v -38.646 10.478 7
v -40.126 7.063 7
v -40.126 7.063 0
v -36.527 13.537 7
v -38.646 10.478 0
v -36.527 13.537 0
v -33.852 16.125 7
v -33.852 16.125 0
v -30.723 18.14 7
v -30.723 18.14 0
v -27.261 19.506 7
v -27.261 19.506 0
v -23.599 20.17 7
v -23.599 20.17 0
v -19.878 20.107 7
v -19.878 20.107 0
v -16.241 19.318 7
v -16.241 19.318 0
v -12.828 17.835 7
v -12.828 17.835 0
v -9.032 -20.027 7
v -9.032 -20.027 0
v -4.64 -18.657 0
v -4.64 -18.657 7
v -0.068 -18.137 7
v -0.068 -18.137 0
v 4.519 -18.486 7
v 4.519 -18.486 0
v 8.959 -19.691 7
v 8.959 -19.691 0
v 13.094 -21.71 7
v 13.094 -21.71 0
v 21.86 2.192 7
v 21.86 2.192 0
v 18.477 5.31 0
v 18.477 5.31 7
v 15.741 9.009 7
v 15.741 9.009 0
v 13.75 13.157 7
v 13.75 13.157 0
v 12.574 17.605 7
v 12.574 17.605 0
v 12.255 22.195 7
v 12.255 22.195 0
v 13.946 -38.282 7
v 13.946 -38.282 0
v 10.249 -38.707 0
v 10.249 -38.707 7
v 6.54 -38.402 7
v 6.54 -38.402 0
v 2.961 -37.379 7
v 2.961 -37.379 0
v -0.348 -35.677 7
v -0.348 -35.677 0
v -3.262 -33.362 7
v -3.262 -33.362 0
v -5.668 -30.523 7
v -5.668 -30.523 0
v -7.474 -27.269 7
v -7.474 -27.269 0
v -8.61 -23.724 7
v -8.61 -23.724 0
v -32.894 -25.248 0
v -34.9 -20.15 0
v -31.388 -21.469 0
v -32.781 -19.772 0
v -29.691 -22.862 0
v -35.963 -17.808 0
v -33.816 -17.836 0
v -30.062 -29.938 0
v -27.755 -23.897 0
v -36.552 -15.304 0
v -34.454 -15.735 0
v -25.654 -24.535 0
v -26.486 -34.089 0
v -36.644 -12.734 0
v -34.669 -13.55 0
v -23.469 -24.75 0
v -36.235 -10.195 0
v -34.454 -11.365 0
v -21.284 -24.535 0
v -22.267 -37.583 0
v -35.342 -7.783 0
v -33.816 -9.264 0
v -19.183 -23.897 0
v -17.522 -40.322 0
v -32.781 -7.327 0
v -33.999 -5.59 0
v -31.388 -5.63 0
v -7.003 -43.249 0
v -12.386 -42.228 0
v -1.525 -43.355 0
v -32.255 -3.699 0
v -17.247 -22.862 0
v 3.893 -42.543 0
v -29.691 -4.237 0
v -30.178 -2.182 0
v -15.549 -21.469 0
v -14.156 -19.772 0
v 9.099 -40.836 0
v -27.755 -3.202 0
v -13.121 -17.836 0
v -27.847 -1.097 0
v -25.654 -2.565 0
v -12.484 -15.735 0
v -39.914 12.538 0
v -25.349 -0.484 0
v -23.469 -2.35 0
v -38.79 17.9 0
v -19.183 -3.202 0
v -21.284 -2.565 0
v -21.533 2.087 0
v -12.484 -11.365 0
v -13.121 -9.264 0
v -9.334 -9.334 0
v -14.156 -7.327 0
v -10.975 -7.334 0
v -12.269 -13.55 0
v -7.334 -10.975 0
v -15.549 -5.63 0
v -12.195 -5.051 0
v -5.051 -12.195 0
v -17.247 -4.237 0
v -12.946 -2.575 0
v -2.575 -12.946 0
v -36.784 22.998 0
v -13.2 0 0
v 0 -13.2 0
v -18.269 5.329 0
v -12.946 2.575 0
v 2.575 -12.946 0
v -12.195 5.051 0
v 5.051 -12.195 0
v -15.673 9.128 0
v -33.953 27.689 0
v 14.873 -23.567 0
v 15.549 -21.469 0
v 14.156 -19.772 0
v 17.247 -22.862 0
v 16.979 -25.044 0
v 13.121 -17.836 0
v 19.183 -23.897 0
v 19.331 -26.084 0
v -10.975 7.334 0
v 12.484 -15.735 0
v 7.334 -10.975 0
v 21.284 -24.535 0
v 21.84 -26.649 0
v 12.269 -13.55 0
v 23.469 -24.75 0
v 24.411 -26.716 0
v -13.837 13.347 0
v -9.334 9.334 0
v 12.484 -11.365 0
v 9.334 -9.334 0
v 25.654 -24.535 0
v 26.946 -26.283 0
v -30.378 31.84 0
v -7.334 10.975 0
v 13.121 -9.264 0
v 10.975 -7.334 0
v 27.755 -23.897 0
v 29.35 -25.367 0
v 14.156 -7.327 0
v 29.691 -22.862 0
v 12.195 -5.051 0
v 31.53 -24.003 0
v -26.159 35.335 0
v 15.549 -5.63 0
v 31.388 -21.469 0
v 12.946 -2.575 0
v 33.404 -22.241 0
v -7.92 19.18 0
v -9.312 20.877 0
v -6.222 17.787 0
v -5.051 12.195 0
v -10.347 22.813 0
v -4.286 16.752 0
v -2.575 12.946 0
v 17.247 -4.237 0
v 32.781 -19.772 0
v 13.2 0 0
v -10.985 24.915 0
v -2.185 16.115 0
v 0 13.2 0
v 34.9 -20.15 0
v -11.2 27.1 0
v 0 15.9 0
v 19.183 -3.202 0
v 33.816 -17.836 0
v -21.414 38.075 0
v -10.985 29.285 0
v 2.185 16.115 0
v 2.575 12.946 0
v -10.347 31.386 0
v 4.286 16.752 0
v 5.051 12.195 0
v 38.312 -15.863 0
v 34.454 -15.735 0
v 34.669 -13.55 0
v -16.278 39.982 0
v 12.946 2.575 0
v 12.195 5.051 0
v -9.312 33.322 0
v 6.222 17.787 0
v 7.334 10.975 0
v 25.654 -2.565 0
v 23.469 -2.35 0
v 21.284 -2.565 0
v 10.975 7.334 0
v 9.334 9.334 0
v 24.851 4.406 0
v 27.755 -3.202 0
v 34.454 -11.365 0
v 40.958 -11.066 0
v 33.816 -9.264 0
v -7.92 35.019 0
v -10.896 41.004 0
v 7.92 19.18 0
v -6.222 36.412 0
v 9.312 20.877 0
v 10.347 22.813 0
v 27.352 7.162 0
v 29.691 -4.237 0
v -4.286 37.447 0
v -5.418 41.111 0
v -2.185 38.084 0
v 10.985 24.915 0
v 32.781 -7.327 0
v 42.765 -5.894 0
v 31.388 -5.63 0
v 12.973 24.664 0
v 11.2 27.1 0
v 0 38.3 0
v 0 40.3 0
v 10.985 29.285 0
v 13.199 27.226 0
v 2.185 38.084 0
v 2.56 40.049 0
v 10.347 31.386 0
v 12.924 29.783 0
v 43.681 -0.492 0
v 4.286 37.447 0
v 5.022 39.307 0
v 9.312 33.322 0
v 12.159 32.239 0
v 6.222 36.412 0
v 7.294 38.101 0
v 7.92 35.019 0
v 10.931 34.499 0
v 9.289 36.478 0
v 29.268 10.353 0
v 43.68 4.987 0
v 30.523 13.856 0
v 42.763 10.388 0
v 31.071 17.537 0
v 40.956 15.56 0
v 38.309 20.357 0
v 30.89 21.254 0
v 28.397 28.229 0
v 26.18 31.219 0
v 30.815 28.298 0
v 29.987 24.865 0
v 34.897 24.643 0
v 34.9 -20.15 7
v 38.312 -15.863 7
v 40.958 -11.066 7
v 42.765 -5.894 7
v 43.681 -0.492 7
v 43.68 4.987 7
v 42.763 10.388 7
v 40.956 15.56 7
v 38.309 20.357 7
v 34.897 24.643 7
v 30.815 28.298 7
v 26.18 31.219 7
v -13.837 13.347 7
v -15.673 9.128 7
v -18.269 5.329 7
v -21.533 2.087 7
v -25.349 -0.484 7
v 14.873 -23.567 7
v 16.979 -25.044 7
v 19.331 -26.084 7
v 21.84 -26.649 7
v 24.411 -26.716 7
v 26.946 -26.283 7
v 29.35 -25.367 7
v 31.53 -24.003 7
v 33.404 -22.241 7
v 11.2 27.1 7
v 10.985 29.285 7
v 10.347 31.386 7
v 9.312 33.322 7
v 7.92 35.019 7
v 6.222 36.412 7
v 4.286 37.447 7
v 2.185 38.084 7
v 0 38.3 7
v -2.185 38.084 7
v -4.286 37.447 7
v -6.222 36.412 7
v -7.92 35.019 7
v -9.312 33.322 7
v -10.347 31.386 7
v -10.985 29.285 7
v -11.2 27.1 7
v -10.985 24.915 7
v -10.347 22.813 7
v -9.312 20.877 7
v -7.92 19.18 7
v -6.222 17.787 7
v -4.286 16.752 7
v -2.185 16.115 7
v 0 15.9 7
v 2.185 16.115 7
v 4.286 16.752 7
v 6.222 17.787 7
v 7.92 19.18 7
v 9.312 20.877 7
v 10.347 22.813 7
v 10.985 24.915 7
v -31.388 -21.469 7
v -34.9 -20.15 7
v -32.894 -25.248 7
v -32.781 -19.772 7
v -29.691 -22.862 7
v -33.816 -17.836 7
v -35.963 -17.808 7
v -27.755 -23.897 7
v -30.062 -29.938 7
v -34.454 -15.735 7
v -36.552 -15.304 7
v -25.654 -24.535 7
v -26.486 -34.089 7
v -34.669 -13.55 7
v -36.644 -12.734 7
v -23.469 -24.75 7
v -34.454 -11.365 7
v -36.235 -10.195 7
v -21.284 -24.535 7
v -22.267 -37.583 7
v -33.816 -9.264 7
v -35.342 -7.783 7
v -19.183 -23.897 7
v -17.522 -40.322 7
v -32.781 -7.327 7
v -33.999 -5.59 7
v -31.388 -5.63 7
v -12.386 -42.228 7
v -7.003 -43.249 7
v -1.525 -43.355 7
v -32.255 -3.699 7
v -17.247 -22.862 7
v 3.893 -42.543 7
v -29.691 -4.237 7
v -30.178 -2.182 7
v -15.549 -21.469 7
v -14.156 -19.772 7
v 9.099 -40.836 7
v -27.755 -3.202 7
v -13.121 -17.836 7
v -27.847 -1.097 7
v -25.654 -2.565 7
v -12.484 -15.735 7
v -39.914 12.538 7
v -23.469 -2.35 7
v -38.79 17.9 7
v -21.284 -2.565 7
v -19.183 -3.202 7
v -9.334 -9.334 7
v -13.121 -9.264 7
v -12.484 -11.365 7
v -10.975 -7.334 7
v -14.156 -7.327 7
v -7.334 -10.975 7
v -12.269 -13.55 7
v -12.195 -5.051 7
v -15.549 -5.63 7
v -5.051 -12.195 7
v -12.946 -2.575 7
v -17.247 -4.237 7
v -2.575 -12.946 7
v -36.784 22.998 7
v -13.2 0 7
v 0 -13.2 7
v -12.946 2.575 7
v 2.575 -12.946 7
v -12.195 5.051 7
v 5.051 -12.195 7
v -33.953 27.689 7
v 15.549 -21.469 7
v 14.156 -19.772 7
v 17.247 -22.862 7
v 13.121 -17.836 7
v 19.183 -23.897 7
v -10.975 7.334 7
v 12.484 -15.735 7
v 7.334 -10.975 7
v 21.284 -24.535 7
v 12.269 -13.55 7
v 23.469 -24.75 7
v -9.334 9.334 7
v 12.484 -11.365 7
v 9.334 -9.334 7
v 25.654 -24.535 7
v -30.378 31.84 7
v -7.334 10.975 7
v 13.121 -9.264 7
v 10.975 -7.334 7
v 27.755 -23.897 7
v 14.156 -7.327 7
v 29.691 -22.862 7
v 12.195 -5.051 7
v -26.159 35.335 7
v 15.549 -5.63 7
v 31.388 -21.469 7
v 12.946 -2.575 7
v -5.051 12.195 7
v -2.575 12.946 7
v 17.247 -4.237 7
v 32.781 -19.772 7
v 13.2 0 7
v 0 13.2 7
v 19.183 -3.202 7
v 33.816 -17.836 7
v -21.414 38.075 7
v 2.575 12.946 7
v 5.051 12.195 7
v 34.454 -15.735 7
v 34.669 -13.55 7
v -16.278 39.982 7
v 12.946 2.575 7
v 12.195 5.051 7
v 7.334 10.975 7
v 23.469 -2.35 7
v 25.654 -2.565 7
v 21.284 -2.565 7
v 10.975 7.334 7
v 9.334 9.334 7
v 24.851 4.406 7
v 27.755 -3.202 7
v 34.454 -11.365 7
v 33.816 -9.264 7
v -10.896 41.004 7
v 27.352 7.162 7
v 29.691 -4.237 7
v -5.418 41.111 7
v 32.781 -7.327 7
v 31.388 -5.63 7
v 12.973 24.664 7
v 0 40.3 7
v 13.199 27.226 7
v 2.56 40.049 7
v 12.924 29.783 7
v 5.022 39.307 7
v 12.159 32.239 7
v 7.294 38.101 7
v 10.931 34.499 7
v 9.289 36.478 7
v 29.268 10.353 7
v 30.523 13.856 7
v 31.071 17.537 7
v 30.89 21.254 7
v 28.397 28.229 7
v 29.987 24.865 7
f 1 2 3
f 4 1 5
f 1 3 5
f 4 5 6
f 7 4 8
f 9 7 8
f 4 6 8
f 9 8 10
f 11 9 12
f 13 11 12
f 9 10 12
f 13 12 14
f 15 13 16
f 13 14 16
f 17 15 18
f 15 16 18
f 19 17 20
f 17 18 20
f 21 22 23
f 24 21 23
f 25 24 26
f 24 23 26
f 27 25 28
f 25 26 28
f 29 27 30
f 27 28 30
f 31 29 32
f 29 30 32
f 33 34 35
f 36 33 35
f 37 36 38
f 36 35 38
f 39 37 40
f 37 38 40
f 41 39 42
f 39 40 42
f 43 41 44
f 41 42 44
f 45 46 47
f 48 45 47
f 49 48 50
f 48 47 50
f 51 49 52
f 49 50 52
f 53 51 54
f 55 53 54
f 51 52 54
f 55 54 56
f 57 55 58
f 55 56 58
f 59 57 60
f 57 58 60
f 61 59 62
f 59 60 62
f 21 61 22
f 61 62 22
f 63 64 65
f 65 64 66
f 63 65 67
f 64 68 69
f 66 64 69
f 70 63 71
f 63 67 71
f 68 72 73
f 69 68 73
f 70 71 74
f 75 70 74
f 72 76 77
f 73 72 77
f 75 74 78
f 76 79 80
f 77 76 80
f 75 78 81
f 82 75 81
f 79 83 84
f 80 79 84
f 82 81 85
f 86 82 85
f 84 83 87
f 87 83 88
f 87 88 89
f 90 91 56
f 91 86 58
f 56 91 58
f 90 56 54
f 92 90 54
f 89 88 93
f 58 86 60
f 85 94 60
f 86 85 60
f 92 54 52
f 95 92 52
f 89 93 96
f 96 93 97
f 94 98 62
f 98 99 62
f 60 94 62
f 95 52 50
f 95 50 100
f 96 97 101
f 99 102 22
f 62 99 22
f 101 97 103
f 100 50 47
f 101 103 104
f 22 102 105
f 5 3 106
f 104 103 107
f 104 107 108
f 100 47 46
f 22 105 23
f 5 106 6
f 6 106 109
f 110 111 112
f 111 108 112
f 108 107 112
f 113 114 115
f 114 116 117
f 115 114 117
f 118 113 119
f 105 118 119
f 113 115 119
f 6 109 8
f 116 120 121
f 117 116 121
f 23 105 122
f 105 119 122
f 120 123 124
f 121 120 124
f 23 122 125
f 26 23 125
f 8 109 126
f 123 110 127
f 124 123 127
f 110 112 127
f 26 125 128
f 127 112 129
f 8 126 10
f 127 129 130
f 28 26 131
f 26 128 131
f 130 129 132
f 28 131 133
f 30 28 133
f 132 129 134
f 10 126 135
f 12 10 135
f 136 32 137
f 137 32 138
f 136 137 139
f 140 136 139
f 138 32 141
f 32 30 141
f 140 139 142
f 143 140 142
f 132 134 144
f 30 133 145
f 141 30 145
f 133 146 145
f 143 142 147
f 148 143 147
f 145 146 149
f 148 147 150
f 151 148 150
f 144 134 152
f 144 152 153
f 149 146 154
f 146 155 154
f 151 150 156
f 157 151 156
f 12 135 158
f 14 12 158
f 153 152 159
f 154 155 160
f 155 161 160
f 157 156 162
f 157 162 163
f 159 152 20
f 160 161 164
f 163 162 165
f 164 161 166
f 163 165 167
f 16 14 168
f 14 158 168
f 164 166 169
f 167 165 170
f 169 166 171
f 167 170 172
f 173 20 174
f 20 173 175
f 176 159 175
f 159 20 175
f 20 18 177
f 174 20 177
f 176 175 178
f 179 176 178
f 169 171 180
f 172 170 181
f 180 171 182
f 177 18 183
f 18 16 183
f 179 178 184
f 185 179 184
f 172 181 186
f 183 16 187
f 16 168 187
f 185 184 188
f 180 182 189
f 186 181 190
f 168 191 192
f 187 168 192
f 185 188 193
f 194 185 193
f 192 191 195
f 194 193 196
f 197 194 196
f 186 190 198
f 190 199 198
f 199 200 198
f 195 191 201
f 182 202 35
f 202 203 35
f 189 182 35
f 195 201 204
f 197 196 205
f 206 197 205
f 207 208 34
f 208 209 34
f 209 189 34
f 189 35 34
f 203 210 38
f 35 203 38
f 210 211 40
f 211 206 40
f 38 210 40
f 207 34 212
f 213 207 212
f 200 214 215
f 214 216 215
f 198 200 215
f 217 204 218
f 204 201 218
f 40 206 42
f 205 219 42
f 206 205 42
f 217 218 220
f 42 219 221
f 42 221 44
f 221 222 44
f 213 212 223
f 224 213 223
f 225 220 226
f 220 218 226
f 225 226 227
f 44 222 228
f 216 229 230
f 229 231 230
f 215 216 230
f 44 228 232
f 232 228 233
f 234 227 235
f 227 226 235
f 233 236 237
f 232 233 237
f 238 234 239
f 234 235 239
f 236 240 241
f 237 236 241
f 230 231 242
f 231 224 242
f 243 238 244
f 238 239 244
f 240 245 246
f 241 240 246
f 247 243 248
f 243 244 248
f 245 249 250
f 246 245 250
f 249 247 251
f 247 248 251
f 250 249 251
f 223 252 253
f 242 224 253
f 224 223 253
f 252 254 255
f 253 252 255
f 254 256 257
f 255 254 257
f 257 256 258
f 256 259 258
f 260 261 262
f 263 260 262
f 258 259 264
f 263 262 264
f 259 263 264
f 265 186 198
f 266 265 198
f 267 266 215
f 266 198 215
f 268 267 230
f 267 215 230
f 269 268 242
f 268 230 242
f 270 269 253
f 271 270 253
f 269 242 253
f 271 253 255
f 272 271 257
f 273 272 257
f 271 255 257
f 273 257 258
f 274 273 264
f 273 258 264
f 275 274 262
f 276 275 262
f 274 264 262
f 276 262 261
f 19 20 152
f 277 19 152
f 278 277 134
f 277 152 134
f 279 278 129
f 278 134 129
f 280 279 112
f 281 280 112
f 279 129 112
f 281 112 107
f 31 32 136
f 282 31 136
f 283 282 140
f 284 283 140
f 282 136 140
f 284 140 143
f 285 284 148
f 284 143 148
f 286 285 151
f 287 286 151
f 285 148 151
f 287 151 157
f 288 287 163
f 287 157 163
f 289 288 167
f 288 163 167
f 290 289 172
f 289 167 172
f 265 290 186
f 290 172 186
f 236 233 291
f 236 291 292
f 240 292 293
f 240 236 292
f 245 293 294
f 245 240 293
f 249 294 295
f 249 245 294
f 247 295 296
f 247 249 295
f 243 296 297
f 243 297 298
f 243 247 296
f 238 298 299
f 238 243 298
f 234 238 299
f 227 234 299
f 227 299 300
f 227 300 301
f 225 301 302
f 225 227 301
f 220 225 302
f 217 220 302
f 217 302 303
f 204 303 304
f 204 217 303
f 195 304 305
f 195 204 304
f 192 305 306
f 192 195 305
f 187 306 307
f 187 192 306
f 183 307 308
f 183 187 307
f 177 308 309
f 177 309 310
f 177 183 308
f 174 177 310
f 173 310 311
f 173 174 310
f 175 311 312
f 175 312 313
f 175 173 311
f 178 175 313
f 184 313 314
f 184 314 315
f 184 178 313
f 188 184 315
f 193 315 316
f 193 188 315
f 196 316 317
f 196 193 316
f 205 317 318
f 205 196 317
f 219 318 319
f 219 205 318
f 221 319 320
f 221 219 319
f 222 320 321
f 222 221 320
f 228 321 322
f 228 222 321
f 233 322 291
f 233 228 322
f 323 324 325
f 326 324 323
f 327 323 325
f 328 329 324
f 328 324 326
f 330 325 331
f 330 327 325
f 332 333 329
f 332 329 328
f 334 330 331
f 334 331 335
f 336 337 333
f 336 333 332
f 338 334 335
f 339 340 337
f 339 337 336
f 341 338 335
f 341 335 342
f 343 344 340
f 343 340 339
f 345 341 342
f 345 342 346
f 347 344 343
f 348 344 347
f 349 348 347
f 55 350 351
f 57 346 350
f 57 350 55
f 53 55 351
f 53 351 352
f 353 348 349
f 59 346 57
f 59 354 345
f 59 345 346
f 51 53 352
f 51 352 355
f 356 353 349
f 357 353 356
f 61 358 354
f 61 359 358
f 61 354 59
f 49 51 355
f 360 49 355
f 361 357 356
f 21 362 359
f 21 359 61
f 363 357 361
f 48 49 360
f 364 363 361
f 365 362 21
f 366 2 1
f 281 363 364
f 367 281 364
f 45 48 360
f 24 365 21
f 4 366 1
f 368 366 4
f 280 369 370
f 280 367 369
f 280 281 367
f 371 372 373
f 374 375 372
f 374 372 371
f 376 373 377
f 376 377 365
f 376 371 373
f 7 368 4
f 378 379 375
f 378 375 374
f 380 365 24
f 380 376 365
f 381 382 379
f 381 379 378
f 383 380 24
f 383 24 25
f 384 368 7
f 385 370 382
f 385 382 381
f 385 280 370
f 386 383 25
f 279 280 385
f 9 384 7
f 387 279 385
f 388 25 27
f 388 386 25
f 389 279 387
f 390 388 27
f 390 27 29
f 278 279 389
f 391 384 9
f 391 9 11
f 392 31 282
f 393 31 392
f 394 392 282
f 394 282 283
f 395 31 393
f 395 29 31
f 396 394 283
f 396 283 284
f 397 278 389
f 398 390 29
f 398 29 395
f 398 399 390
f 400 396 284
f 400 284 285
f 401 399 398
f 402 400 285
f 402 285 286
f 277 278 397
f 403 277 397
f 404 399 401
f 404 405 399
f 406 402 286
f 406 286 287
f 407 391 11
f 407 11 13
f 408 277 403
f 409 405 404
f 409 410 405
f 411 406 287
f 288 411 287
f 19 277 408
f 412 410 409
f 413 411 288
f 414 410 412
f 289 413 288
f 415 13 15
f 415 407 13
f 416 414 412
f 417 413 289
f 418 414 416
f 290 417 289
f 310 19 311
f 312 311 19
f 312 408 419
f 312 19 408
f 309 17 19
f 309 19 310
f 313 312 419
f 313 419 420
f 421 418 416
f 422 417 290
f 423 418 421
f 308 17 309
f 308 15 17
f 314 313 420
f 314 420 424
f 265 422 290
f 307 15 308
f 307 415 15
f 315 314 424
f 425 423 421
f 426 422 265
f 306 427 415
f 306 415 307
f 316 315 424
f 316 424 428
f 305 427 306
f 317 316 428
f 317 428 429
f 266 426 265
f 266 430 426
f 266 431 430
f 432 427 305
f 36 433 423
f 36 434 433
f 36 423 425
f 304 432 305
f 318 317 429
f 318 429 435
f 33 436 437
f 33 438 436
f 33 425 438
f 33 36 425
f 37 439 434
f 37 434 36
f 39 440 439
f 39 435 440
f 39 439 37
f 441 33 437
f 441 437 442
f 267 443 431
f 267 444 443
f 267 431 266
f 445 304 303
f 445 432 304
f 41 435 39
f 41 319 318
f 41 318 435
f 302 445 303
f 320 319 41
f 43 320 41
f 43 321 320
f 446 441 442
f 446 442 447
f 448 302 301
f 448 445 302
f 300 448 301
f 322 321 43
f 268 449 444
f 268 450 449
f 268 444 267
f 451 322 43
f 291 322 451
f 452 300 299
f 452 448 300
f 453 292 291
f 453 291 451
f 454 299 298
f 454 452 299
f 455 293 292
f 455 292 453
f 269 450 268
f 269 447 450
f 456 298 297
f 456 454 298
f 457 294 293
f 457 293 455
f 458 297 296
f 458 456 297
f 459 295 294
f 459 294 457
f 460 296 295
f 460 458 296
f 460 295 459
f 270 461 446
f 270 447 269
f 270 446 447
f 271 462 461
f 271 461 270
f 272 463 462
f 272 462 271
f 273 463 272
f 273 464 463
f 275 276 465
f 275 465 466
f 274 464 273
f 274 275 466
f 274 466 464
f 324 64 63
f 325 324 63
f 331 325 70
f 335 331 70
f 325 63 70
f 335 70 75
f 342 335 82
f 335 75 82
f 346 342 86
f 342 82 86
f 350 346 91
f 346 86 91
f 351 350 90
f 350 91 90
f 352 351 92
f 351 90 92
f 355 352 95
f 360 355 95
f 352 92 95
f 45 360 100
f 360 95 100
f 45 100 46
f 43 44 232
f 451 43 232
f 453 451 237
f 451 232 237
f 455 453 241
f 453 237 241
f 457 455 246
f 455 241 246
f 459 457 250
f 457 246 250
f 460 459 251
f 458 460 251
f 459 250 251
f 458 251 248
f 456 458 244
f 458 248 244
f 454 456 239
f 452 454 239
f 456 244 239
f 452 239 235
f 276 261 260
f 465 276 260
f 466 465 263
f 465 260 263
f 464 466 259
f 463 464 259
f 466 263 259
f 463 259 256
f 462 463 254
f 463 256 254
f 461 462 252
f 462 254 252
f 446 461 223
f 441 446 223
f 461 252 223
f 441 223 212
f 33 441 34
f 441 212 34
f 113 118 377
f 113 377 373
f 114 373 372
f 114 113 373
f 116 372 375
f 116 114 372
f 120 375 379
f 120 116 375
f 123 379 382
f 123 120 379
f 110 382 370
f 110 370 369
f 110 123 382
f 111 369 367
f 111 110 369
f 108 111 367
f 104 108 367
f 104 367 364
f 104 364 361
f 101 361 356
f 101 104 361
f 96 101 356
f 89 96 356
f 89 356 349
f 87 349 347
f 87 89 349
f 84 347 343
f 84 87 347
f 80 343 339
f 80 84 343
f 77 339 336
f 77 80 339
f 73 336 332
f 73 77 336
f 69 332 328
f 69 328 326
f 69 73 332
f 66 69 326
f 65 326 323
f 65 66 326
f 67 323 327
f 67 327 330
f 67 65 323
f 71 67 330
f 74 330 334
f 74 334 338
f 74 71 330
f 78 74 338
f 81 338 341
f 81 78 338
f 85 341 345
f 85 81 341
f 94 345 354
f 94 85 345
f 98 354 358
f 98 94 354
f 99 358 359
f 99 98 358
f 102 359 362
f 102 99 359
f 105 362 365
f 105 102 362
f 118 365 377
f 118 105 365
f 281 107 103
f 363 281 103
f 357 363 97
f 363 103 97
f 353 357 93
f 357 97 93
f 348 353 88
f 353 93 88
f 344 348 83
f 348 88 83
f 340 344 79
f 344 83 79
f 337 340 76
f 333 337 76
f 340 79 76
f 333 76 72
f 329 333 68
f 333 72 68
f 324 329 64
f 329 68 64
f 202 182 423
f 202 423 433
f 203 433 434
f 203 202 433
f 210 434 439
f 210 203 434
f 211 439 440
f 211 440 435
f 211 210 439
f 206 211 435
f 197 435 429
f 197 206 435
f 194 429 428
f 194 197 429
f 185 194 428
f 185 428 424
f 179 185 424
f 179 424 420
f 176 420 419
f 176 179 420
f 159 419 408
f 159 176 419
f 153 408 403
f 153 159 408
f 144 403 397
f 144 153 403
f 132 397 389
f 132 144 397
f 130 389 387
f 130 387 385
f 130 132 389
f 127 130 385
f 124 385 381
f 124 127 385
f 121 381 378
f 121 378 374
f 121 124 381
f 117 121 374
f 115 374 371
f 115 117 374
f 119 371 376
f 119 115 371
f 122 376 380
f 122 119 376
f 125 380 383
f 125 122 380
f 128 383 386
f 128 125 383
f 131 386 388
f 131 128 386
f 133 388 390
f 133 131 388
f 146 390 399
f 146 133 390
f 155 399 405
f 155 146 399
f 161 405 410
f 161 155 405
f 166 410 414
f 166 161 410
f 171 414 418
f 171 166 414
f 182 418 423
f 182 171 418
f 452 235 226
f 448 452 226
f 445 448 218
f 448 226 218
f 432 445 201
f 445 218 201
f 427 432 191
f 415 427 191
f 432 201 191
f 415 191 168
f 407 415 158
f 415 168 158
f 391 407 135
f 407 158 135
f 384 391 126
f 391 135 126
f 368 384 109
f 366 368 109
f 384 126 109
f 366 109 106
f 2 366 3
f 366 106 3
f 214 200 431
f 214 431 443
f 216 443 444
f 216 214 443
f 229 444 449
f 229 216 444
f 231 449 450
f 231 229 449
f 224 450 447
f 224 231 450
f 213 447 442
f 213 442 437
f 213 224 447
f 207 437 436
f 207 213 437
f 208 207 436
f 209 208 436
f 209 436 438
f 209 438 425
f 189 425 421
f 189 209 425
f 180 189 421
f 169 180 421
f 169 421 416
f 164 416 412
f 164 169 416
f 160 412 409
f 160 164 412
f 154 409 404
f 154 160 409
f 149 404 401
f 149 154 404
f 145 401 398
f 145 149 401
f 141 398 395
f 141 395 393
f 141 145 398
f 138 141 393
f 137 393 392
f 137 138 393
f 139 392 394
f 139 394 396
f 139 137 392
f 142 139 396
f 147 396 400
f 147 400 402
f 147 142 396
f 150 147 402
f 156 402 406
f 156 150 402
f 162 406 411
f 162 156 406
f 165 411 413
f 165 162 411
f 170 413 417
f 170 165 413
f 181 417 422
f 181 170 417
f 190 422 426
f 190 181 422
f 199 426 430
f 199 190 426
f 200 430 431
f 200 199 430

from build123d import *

# Parameters (mm, degrees)
F0_R     = 11.2
F0_R_2   = 13.2
F1_DEPTH = 7


with BuildPart() as f1:
    # F0 (on Top) → F1 (new body)
    with BuildSketch(Plane.XY):
        with BuildLine():
            ThreePointArc((21.859796, 2.191562), (14.647279, 11.035914), (12.254917, 22.194749))
            ThreePointArc((12.254917, 22.194749), (10.931223, 34.498756), (0, 40.299542))
            ThreePointArc((0, 40.299542), (-10.375988, 35.25913), (-12.827846, 23.987249))
            ThreePointArc((-12.827846, 23.987249), (-12.632849, 20.911303), (-12.827846, 17.835357))
            ThreePointArc((-12.827846, 17.835357), (-16.881022, 7.166958), (-25.348675, -0.484305))
            ThreePointArc((-25.348675, -0.484305), (-35.342411, -7.782661), (-34.900427, -20.149771))
            ThreePointArc((-34.900427, -20.149771), (-25.347308, -26.615434), (-14.359644, -23.102865))
            ThreePointArc((-14.359644, -23.102865), (-11.793295, -21.39602), (-9.03195, -20.026919))
            ThreePointArc((-9.03195, -20.026919), (2.233743, -18.202873), (13.093758, -21.710444))
            ThreePointArc((13.093758, -21.710444), (24.411188, -26.716095), (34.900427, -20.149771))
            ThreePointArc((34.900427, -20.149771), (35.723296, -8.643695), (27.18749, -0.884384))
            ThreePointArc((27.18749, -0.884384), (24.426145, 0.484717), (21.859796, 2.191562))
        make_face()
        with Locations((-23.468892, -13.549771)):
            Circle(F0_R, mode=Mode.SUBTRACT)
        with Locations((23.468892, -13.549771)):
            Circle(F0_R, mode=Mode.SUBTRACT)
        Circle(F0_R_2, mode=Mode.SUBTRACT)
        with Locations((0, 27.099542)):
            Circle(F0_R, mode=Mode.SUBTRACT)
        with BuildLine():
            ThreePointArc((-12.827846, 23.987249), (-10.375988, 35.25913), (0, 40.299542))
            ThreePointArc((0, 40.299542), (-28.341803, 33.676362), (-40.126432, 7.063454))
            ThreePointArc((-40.126432, 7.063454), (-29.025745, 18.908185), (-12.827846, 17.835357))
            ThreePointArc((-12.827846, 17.835357), (-12.632849, 20.911303), (-12.827846, 23.987249))
        make_face()
        with BuildLine():
            ThreePointArc((26.180347, 31.218782), (30.887841, 15.68294), (21.859796, 2.191562))
            ThreePointArc((21.859796, 2.191562), (24.426145, 0.484717), (27.18749, -0.884384))
            ThreePointArc((27.18749, -0.884384), (35.723296, -8.643695), (34.900427, -20.149771))
            ThreePointArc((34.900427, -20.149771), (43.335487, 7.706541), (26.180347, 31.218782))
        make_face()
        with BuildLine():
            ThreePointArc((-14.359644, -23.102865), (-25.347308, -26.615434), (-34.900427, -20.149771))
            ThreePointArc((-34.900427, -20.149771), (-14.993684, -41.382903), (13.946085, -38.282236))
            ThreePointArc((13.946085, -38.282236), (-1.862096, -34.591125), (-9.03195, -20.026919))
            ThreePointArc((-9.03195, -20.026919), (-11.793295, -21.39602), (-14.359644, -23.102865))
        make_face()
    extrude(amount=F1_DEPTH)


solid = f1.part
